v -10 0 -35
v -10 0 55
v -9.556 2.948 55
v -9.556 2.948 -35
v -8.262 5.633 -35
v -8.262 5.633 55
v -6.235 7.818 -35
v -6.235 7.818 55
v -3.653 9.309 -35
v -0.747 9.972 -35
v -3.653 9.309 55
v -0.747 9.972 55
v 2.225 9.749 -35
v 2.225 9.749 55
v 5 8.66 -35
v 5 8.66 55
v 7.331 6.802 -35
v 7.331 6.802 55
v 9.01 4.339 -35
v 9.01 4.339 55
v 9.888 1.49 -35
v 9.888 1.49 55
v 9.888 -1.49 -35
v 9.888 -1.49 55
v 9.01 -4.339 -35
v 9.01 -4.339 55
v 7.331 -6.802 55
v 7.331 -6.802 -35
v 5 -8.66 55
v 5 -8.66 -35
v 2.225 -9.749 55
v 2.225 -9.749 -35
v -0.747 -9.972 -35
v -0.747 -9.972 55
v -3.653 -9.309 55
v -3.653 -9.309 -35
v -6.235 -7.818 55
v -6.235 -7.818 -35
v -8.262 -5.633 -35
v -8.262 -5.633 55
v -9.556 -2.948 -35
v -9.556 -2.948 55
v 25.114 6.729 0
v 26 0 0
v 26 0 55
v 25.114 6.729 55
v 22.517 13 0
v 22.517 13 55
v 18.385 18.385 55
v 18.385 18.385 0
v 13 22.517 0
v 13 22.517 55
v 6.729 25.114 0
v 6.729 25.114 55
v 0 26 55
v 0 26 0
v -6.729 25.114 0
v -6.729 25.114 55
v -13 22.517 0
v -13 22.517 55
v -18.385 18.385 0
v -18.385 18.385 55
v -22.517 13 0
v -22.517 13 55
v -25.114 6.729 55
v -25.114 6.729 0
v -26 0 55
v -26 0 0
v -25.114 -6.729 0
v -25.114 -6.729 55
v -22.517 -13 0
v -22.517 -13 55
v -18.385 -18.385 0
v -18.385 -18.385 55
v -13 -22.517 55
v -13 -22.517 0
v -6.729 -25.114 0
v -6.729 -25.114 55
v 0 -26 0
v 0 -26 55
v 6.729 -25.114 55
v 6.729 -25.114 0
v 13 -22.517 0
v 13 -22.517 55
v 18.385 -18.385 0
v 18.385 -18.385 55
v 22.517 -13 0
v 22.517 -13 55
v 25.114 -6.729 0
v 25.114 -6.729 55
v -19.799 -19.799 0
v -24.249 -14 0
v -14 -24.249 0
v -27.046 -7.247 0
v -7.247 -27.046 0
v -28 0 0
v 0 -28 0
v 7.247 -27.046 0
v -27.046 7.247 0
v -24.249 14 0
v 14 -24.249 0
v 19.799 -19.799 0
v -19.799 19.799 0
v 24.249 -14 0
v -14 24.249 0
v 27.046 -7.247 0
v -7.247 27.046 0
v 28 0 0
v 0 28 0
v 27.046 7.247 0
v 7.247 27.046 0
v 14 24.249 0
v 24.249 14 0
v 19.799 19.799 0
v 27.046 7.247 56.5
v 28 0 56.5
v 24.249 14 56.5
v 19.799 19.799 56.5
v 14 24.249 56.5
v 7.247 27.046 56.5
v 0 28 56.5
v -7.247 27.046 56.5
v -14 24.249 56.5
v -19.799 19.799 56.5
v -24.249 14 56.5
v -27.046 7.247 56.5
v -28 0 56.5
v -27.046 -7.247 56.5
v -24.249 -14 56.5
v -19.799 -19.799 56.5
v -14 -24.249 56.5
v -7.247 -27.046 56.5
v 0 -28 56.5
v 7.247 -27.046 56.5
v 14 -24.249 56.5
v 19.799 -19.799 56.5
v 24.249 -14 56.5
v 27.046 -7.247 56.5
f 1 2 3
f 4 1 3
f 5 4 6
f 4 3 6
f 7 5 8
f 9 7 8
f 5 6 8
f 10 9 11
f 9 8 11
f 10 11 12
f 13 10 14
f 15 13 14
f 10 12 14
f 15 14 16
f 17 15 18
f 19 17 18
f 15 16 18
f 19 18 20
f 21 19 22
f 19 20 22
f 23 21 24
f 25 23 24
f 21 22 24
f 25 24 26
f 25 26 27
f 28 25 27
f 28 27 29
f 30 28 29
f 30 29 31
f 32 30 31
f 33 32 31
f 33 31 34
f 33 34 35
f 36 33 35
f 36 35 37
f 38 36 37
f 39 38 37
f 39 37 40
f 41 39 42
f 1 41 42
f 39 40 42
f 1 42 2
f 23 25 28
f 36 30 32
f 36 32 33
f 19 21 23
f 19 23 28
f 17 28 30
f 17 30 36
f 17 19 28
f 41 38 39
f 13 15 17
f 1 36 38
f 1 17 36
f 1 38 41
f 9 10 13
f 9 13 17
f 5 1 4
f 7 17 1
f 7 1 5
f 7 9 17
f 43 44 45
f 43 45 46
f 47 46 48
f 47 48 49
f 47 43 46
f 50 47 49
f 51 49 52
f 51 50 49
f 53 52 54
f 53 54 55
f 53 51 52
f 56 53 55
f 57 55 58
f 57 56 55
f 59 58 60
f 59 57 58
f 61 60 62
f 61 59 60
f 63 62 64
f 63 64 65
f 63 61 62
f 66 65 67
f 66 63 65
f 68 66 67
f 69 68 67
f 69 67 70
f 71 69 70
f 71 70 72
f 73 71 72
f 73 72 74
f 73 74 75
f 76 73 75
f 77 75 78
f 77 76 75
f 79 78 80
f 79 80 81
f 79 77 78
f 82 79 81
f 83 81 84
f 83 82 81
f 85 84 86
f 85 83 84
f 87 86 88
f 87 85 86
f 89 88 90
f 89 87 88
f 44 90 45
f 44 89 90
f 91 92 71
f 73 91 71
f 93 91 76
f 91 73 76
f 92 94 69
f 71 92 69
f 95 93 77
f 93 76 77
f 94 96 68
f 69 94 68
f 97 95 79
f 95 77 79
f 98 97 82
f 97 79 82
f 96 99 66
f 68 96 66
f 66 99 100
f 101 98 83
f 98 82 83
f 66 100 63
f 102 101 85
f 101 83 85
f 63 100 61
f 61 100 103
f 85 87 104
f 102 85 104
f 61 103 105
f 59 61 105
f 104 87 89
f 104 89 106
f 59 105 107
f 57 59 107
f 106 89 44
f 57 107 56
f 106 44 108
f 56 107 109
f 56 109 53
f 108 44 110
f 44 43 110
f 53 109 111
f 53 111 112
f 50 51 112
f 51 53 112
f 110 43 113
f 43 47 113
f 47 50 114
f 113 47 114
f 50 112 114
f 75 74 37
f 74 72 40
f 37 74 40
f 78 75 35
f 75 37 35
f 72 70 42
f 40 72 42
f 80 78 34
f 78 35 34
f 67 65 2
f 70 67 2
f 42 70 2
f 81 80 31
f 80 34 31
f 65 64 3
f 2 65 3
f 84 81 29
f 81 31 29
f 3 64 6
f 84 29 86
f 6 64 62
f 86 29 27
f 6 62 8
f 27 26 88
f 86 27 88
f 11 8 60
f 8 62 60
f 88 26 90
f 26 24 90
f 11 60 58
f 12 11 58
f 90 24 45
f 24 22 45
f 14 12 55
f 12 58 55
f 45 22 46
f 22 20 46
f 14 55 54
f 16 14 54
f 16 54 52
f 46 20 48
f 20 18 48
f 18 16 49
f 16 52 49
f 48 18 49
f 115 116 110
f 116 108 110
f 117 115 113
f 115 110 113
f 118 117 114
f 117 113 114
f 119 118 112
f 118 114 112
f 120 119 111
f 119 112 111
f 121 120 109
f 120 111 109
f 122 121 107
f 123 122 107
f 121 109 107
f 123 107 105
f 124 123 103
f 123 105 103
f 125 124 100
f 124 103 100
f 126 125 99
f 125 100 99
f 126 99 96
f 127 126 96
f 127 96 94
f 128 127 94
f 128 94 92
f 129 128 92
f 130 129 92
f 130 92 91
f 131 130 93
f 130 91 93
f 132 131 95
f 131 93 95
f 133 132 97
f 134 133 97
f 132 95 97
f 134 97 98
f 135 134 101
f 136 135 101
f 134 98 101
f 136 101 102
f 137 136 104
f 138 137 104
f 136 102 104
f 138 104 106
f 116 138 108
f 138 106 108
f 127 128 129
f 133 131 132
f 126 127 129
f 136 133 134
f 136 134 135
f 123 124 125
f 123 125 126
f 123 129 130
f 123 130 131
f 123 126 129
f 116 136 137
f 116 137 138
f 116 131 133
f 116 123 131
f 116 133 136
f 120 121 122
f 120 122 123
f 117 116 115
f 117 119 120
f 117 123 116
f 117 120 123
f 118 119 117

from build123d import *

# Parameters (mm, degrees)
SKETCH1_R           = 28
SKETCH1_R_2         = 26
BOSS_EXTRUDE1_DEPTH = 55
SKETCH2_R           = 28
BOSS_EXTRUDE2_DEPTH = 1.5
SKETCH3_R           = 10
BOSS_EXTRUDE3_DEPTH = 90


with BuildPart() as part:
    # Sketch1 → Boss-Extrude1 (new body)
    with BuildSketch(Plane.XY):
        Circle(SKETCH1_R)
        Circle(SKETCH1_R_2, mode=Mode.SUBTRACT)
    extrude(amount=BOSS_EXTRUDE1_DEPTH)

    # Sketch2 → Boss-Extrude2 (add)
    with BuildSketch(Plane.XY.offset(55)):
        Circle(SKETCH2_R)
    extrude(amount=BOSS_EXTRUDE2_DEPTH)

    # Sketch3 → Boss-Extrude3 (add)
    with BuildSketch(Plane(origin=(0, 0, 55), x_dir=(-1, 0, 0), z_dir=(0, 0, -1))):
        Circle(SKETCH3_R)
    extrude(amount=BOSS_EXTRUDE3_DEPTH)


solid = part.part
